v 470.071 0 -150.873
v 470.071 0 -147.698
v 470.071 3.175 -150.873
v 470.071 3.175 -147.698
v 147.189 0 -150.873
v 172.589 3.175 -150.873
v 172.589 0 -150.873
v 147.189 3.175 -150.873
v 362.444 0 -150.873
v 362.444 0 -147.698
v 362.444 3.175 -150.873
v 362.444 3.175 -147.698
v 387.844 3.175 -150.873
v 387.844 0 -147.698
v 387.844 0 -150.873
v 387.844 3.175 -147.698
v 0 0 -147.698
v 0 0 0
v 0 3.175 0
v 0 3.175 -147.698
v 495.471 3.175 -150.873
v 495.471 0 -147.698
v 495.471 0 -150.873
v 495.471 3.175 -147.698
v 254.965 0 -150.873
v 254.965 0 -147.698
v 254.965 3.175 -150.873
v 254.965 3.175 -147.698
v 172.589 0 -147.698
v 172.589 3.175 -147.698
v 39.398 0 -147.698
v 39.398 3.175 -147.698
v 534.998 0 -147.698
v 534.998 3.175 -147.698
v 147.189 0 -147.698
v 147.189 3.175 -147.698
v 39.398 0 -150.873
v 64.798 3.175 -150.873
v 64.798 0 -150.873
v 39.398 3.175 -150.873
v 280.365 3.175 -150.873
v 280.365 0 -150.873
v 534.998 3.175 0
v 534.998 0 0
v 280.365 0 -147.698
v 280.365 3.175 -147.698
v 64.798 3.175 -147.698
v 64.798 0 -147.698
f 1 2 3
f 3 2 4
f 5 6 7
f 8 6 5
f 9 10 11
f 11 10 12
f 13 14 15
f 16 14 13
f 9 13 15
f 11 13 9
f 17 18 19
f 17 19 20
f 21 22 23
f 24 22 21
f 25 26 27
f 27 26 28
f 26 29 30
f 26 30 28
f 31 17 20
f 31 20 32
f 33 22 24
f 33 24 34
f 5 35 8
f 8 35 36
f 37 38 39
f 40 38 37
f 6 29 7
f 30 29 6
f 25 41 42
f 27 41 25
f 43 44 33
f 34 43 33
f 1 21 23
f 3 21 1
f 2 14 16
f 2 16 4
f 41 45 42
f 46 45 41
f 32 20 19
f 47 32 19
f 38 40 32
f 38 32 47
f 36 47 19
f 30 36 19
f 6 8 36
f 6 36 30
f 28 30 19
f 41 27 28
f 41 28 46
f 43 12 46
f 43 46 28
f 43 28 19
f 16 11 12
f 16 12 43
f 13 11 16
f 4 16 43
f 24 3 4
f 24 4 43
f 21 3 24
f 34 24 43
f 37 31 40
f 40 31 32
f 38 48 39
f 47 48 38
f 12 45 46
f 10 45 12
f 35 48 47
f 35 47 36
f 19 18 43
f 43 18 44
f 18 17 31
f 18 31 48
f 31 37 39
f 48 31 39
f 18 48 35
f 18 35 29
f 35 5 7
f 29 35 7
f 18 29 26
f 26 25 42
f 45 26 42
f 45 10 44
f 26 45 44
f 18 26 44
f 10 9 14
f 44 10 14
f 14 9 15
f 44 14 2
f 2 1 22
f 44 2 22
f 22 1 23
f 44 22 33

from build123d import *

# Parameters (mm, degrees)
SKETCH1_W           = 534.99766
SKETCH1_H           = 147.69846
BOSS_EXTRUDE1_DEPTH = 3.175
SKETCH2_W           = 25.4
SKETCH2_H           = 3.175
BOSS_EXTRUDE2_DEPTH = 3.175


with BuildPart() as part:
    # Sketch1 → Boss-Extrude1 (new body)
    with BuildSketch(Plane(origin=(0, 0, 0), x_dir=(1, 0, 0), z_dir=(0, 1, 0))):
        with Locations((267.49883, 73.84923)):
            Rectangle(SKETCH1_W, SKETCH1_H)
    extrude(amount=BOSS_EXTRUDE1_DEPTH)

    # Sketch2 → Boss-Extrude2 (add)
    with BuildSketch(Plane(origin=(0, 0, -147.69846), x_dir=(-1, 0, 0), z_dir=(0, 0, -1))):
        with Locations((-482.77145, 1.5875)):
            Rectangle(SKETCH2_W, SKETCH2_H)
        with Locations((-375.14403, 1.5875)):
            Rectangle(SKETCH2_W, SKETCH2_H)
        with Locations((-267.665260384, 1.5875)):
            Rectangle(SKETCH2_W, SKETCH2_H)
        with Locations((-159.888954488, 1.5875)):
            Rectangle(SKETCH2_W, SKETCH2_H)
        with Locations((-52.098109833, 1.5875)):
            Rectangle(SKETCH2_W, SKETCH2_H)
    extrude(amount=BOSS_EXTRUDE2_DEPTH)


solid = part.part
